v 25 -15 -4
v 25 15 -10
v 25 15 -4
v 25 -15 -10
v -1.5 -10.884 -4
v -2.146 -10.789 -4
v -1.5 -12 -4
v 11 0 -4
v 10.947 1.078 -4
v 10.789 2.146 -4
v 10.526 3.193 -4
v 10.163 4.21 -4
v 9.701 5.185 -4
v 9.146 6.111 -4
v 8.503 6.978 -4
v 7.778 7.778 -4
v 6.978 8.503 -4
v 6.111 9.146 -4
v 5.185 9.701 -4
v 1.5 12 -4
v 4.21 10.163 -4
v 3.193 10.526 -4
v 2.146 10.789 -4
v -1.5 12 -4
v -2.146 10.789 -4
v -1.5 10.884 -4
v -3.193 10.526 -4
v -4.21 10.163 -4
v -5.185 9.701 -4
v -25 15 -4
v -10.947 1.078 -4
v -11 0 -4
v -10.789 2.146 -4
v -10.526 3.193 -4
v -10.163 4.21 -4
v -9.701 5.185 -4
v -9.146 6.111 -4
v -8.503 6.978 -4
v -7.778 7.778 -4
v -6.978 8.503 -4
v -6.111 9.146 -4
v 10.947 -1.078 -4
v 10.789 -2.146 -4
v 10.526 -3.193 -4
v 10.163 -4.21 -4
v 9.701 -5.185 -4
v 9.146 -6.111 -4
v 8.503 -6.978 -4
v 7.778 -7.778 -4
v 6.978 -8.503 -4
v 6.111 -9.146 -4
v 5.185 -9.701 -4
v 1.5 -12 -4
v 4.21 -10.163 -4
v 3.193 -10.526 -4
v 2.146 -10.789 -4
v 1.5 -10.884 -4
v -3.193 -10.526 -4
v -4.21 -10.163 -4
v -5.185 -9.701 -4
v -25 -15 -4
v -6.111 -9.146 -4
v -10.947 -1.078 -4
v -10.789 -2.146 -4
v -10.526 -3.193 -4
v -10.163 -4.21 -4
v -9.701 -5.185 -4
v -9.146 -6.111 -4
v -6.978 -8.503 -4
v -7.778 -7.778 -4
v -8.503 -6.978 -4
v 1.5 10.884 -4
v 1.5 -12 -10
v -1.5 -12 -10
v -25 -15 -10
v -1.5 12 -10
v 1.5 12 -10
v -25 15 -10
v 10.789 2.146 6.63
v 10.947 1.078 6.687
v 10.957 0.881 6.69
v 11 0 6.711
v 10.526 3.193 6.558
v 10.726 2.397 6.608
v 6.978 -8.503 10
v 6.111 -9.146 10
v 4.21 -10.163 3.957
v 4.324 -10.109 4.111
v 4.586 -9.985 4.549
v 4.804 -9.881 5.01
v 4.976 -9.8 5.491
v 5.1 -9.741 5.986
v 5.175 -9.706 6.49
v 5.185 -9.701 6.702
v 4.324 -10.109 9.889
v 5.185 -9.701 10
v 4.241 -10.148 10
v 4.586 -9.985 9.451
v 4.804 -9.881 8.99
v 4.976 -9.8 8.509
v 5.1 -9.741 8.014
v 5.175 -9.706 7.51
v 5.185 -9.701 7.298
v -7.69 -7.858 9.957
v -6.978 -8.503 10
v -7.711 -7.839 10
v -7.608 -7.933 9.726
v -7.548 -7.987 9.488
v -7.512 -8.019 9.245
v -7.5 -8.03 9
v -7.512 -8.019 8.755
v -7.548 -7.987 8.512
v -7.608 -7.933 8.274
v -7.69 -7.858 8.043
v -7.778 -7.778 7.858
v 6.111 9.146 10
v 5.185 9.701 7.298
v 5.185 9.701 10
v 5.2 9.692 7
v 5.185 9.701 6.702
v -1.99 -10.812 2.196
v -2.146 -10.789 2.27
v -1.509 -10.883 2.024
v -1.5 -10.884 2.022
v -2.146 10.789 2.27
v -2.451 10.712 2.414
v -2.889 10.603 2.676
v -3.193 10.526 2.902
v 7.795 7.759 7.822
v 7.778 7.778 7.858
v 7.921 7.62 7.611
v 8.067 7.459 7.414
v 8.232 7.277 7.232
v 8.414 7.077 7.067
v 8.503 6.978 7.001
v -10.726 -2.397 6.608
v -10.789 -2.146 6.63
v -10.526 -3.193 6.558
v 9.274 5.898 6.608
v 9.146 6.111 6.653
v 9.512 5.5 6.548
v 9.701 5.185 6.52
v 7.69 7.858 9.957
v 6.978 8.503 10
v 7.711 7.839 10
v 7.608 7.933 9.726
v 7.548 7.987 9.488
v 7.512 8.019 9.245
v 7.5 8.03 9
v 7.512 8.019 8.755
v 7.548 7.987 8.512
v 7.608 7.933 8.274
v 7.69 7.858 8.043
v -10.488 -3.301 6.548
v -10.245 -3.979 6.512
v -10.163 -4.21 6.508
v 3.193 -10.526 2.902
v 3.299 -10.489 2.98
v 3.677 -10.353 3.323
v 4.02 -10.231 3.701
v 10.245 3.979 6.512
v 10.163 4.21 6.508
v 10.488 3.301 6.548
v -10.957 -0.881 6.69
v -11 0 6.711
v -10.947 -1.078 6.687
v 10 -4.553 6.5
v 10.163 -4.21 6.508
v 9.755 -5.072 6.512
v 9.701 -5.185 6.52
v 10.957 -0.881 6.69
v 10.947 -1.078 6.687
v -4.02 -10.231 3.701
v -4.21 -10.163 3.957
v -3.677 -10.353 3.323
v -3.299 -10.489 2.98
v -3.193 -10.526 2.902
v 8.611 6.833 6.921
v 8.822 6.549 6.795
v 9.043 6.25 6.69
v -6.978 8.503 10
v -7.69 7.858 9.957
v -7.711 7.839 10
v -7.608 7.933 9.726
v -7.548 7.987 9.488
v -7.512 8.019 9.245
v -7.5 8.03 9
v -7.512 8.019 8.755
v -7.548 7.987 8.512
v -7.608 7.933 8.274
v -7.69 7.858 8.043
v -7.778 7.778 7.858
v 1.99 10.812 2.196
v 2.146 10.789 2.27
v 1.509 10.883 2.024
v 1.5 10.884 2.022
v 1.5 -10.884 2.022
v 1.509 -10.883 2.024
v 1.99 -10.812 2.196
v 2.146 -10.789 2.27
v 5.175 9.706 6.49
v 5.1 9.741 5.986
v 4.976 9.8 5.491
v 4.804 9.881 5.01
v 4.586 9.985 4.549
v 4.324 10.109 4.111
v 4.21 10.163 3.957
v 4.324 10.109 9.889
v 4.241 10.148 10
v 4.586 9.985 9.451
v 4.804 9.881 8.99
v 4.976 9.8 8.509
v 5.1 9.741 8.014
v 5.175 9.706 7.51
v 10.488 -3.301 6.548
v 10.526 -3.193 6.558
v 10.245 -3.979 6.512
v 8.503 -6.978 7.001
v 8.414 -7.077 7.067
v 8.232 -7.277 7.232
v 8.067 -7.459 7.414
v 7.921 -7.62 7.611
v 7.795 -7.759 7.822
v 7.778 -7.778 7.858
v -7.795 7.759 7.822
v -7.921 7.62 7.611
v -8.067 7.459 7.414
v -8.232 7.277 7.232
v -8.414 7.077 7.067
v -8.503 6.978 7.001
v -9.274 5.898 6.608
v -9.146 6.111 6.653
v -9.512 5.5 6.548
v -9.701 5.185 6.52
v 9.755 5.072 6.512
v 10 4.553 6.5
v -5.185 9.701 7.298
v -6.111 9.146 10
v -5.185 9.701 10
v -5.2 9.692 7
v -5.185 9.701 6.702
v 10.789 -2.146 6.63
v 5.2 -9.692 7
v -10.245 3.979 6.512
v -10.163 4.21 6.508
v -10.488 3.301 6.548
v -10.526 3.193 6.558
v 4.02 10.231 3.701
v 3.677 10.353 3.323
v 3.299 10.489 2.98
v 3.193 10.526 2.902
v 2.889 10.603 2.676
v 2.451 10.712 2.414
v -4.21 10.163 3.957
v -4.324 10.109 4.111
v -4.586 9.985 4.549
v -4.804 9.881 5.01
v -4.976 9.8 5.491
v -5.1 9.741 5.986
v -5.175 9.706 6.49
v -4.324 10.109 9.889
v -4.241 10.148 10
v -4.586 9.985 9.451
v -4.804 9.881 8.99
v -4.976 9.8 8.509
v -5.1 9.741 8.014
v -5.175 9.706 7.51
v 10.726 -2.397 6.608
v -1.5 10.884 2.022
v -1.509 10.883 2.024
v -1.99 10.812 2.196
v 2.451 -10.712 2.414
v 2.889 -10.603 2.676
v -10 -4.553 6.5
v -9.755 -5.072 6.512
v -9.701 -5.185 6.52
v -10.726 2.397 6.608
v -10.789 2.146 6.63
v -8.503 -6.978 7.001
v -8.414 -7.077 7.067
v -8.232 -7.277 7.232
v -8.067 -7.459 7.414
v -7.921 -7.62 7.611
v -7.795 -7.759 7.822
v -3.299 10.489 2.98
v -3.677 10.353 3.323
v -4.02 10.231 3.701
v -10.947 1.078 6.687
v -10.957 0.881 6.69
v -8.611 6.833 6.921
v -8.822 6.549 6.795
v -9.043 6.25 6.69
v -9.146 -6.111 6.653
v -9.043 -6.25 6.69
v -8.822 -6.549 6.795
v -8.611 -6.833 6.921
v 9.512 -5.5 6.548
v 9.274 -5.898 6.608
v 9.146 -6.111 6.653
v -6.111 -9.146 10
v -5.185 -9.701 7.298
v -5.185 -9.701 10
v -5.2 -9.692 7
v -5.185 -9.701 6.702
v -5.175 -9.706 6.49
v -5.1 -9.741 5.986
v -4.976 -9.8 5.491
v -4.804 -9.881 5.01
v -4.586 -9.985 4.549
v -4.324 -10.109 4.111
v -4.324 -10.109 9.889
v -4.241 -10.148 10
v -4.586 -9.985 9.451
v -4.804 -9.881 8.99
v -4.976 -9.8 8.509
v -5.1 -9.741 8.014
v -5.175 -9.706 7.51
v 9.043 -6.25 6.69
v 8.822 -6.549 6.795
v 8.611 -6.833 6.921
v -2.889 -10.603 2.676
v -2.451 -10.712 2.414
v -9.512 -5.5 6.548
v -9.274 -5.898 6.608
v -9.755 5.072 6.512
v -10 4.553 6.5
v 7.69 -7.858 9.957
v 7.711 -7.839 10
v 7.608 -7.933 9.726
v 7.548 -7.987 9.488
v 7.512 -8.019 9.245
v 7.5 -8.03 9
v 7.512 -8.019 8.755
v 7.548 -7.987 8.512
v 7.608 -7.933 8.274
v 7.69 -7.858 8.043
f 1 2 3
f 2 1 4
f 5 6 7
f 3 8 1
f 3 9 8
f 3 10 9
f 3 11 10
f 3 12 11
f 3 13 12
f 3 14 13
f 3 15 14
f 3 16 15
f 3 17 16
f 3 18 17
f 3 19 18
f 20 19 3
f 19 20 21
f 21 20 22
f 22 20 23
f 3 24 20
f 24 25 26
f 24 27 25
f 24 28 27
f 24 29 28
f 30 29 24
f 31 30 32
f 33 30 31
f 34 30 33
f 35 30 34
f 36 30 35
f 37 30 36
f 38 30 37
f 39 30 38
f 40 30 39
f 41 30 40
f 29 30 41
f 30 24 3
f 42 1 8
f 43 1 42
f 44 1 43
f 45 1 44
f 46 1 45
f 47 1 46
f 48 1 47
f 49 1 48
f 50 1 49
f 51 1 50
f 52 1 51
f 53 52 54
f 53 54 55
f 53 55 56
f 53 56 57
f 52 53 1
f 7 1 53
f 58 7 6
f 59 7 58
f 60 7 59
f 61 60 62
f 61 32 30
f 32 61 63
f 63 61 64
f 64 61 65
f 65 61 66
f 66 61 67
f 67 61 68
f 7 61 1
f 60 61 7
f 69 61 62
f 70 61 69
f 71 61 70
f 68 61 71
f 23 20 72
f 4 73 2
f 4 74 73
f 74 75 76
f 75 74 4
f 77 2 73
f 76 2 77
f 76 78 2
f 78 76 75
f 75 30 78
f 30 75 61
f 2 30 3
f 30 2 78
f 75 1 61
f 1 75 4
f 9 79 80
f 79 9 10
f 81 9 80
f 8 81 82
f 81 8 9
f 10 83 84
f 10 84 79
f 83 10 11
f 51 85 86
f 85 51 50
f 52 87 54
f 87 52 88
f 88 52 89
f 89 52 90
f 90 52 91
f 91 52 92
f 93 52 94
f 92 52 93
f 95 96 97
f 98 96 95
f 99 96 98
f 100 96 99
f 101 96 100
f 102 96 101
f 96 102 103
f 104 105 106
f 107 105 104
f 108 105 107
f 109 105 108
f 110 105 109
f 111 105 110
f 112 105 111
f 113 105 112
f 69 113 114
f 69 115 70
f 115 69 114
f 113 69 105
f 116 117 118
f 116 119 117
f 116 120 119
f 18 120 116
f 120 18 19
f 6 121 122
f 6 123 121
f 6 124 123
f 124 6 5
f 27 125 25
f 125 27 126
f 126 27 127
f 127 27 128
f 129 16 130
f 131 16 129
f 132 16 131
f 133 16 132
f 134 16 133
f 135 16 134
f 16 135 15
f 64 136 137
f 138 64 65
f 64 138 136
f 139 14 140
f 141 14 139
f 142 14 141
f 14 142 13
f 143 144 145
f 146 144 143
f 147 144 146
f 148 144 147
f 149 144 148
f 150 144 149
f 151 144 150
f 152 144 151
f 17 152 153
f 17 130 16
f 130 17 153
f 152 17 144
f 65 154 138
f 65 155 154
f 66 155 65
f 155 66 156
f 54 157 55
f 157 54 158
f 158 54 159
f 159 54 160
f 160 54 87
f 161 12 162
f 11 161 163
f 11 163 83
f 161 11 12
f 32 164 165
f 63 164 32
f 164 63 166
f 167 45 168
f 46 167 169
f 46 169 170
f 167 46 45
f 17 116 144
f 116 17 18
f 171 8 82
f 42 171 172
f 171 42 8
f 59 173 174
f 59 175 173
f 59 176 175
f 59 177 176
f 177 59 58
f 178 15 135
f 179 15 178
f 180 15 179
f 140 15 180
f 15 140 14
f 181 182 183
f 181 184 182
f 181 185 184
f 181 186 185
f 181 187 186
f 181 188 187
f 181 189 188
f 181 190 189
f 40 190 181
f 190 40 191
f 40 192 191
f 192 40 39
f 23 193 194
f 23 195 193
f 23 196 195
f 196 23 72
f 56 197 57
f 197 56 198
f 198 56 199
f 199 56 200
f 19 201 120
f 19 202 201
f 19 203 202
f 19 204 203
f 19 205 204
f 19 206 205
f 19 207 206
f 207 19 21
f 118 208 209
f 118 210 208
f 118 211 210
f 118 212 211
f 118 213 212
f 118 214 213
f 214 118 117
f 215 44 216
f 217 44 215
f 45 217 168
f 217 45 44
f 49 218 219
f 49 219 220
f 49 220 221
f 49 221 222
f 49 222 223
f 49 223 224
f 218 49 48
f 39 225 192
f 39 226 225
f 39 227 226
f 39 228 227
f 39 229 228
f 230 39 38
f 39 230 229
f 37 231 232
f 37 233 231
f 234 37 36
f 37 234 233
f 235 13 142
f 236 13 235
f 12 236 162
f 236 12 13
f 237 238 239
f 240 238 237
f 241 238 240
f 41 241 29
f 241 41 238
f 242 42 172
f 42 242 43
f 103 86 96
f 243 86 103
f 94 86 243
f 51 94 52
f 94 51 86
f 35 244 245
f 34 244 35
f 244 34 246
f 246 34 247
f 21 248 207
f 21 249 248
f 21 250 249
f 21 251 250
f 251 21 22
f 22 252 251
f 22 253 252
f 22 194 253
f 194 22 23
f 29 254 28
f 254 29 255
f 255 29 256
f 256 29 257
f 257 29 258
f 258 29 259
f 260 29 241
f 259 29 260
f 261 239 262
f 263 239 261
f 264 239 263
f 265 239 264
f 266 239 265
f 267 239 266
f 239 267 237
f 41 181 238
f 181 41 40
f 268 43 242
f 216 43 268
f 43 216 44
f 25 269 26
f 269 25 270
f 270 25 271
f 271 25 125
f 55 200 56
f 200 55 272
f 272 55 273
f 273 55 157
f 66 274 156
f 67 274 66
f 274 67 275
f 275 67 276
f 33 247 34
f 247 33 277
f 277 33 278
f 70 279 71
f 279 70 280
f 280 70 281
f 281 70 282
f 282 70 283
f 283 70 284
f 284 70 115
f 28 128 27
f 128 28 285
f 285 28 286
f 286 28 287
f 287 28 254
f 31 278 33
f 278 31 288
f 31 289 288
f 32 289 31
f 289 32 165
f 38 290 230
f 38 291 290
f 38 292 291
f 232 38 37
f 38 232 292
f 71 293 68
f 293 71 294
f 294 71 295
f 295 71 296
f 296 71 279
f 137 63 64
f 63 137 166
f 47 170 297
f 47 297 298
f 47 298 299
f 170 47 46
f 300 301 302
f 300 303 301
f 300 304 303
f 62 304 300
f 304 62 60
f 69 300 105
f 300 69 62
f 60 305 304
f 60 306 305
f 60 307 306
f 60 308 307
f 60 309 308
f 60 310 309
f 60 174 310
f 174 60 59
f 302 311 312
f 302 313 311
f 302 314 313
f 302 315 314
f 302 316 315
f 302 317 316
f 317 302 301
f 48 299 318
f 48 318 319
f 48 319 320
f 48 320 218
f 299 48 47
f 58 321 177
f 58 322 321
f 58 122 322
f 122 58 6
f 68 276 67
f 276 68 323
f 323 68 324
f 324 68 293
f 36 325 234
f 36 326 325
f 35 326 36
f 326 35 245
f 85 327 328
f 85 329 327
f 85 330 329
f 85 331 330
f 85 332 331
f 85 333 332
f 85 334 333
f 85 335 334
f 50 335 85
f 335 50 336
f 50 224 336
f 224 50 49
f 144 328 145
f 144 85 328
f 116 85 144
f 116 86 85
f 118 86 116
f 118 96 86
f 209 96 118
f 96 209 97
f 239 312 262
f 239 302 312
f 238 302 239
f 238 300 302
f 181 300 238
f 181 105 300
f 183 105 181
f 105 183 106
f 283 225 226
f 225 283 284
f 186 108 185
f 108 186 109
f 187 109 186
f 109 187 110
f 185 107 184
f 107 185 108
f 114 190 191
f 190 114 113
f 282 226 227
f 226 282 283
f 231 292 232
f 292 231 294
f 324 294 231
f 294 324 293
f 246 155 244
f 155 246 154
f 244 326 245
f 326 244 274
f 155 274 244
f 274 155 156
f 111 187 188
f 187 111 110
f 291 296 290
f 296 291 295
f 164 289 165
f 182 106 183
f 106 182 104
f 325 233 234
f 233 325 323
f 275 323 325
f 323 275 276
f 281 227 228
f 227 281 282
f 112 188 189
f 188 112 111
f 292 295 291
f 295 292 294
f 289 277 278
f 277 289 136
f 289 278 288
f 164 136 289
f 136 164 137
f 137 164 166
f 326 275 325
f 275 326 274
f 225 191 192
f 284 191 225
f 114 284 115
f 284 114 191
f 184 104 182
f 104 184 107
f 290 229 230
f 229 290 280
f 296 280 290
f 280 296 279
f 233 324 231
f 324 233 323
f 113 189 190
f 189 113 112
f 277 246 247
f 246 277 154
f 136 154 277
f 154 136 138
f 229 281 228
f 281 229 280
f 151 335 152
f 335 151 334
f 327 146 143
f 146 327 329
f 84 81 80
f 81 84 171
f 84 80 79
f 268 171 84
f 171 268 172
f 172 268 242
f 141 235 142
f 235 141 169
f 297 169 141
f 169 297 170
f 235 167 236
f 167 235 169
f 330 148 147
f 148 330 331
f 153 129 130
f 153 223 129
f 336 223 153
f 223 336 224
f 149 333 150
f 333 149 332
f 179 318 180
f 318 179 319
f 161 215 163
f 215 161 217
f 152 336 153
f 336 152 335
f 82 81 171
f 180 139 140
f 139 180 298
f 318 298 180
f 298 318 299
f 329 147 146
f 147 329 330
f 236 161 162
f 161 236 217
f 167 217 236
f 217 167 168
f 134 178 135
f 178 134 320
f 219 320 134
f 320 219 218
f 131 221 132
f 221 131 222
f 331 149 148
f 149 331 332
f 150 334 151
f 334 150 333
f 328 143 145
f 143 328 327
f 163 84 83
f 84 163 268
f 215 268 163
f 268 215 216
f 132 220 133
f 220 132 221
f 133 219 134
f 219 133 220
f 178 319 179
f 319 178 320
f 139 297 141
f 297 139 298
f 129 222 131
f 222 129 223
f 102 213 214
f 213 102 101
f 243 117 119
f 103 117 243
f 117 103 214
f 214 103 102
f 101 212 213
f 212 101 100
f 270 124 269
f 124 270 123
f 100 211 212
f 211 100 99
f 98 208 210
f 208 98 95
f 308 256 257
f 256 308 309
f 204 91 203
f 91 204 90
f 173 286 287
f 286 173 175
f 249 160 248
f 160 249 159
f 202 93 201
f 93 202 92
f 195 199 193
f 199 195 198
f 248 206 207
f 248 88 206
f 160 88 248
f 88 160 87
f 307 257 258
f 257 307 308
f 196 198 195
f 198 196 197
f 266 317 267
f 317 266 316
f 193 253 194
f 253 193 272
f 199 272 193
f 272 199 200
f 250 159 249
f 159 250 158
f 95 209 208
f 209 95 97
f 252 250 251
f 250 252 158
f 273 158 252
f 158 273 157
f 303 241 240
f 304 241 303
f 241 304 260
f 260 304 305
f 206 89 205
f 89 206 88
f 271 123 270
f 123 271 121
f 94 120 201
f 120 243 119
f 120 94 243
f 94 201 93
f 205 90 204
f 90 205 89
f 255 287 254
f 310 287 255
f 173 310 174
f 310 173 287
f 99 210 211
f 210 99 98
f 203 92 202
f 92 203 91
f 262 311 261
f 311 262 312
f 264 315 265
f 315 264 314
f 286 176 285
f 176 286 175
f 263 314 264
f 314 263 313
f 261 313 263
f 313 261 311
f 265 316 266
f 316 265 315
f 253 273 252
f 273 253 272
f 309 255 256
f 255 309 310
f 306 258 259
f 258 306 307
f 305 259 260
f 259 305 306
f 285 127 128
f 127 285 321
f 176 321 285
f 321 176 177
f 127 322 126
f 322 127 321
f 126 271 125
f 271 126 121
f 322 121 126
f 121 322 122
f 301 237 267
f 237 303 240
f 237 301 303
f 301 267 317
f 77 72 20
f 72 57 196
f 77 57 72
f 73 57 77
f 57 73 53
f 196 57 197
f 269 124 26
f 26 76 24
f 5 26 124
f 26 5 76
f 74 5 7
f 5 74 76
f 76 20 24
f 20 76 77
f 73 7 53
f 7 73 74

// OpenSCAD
$fn=64;

rod_d = 10.0;
rod_r = rod_d/2;

bracket_h = 20.0;

base_len = 50.0;
base_w   = 30.0;
base_t   = 6.0;

wall_t   = 6.0;
outer_r  = rod_r + wall_t;          // 11mm
outer_d  = outer_r*2;

cap_t    = 6.0;                      // top thickness above rod center
center_z = base_t + outer_r;         // rod center height

slot_w   = 3.0;                      // clamp slit width
bolt_d   = 5.0;                      // M5 clearance
bolt_head_d = 9.5;                   // socket head clearance
bolt_head_h = 4.0;

bolt_x_offset = 10.0;                // from centerline
bolt_z = center_z + 2.0;             // slightly above center

module base_plate(){
    translate([-base_len/2, -base_w/2, 0])
        cube([base_len, base_w, base_t], center=false);
}

module saddle_block(){
    translate([0,0,base_t])
        cylinder(h=bracket_h-base_t, r=outer_r, center=false);
}

module rod_bore(){
    translate([0,0,center_z])
        rotate([90,0,0])
            cylinder(h=base_w+2, r=rod_r+0.2, center=true);
}

module clamp_slot(){
    translate([0,0,base_t])
        cube([slot_w, outer_d+2, bracket_h-base_t+1], center=true);
}

module bolt_hole(xpos){
    translate([xpos,0,bolt_z])
        rotate([90,0,0]){
            cylinder(h=base_w+2, r=bolt_d/2, center=true);
            translate([0, (base_w/2 - bolt_head_h/2), 0])
                cylinder(h=bolt_head_h, r=bolt_head_d/2, center=true);
        }
}

module bracket(){
    difference(){
        union(){
            base_plate();
            saddle_block();
        }
        rod_bore();
        clamp_slot();
        bolt_hole(-bolt_x_offset);
        bolt_hole( bolt_x_offset);
    }
}

translate([0,0,-bracket_h/2])
    bracket();
